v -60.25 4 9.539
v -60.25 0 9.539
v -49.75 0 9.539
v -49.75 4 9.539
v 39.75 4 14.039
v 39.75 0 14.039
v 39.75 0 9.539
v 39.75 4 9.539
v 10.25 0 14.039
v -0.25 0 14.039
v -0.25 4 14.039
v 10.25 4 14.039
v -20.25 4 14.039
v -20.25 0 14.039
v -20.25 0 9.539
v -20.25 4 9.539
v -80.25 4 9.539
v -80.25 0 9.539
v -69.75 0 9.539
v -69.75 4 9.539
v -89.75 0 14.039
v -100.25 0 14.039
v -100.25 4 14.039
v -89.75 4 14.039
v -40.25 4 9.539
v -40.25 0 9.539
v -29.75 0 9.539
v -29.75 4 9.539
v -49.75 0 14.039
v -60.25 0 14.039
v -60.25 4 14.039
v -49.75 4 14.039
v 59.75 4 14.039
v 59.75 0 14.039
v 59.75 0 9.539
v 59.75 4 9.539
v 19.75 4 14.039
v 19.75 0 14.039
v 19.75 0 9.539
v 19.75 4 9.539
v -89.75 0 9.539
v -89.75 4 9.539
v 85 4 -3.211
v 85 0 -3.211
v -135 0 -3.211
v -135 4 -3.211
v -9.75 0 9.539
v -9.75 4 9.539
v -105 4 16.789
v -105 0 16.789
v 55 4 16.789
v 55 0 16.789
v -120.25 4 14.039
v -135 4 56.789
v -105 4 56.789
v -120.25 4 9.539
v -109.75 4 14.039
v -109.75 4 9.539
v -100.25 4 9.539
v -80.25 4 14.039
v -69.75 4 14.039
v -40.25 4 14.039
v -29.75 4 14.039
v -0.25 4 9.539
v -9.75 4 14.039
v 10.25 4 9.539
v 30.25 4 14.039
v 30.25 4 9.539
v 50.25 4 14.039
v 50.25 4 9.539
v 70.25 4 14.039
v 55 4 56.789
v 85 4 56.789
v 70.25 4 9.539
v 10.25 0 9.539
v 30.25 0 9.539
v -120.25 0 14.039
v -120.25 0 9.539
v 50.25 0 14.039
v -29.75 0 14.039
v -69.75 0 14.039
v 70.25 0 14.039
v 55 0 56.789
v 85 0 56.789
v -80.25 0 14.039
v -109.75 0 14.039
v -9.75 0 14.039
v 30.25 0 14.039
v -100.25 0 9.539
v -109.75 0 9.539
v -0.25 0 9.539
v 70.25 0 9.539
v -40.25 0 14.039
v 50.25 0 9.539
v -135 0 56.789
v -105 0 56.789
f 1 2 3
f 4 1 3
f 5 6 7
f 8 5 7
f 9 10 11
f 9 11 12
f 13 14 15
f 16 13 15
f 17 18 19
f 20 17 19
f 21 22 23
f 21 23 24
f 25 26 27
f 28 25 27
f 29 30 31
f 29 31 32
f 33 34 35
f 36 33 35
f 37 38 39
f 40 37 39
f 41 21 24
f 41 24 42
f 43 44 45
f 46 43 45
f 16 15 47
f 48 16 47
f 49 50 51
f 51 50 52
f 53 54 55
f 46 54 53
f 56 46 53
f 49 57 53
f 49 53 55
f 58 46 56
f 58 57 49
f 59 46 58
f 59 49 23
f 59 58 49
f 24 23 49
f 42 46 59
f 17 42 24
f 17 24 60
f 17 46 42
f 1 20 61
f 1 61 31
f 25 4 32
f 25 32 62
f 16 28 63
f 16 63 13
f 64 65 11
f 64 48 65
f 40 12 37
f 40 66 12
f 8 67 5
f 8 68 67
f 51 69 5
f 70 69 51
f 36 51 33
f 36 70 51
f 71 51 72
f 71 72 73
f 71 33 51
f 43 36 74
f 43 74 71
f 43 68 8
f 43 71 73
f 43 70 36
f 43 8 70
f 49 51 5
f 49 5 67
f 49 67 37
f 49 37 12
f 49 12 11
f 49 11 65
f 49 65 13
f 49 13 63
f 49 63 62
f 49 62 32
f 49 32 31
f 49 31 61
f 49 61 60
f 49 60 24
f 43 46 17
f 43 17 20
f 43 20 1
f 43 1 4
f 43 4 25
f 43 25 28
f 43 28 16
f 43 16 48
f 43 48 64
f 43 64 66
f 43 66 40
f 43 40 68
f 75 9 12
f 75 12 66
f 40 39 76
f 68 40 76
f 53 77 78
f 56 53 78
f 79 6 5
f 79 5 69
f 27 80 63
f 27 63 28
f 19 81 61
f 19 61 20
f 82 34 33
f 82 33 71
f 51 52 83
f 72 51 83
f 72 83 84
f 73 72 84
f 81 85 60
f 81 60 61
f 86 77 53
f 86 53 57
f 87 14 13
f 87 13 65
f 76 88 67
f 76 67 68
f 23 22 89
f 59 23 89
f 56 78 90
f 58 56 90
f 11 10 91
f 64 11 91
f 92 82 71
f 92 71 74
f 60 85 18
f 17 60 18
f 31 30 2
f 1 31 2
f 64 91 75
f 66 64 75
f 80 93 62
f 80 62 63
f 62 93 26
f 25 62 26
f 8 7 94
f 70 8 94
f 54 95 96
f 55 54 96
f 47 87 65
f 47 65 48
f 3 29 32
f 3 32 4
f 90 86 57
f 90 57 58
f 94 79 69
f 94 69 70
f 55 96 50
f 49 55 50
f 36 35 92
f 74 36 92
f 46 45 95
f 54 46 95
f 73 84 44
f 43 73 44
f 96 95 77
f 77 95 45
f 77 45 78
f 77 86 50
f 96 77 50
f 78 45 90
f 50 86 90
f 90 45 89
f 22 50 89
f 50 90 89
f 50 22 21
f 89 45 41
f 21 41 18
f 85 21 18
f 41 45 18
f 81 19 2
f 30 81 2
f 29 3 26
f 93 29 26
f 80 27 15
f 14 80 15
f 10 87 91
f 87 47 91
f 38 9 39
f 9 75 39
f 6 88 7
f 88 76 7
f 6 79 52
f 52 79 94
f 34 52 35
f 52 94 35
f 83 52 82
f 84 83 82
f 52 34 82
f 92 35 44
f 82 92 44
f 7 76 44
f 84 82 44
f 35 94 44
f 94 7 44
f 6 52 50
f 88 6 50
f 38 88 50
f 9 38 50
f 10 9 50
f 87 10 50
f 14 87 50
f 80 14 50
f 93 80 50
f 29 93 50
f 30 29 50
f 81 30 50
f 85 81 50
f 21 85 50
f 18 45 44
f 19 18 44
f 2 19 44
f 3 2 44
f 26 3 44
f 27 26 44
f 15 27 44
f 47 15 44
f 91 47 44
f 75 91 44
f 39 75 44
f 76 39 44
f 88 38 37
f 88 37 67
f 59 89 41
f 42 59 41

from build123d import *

# Parameters (mm, degrees)
EXTRUDE_1_DEPTH     = 4
SKETCH_2_W          = 10.5
SKETCH_2_H          = 4.5
CUT_EXTRUDE_1_DEPTH = 147.512735554


with BuildPart() as part:
    # Эскиз1 → Бобышка-Вытянуть1 (new body)
    with BuildSketch(Plane(origin=(0, 0, 0), x_dir=(1, 0, 0), z_dir=(0, 1, 0))):
        Polygon((-135, -16.788922156), (-135, -56.788922156), (-105, -56.788922156), (-105, -16.788922156), (55, -16.788922156), (55, -56.788922156), (85, -56.788922156), (85, -16.788922156), (85, 3.211077844), (-135, 3.211077844), align=None)
    extrude(amount=EXTRUDE_1_DEPTH)

    # Эскиз2 → Вырез-Вытянуть1 (cut, through all)
    with BuildSketch(Plane(origin=(0, 0, 0), x_dir=(1, 0, 0), z_dir=(0, 1, 0))):
        with Locations((-115, -11.788922156)):
            Rectangle(SKETCH_2_W, SKETCH_2_H)
        with Locations((-95, -11.788922156)):
            Rectangle(SKETCH_2_W, SKETCH_2_H)
        with Locations((-75, -11.788922156)):
            Rectangle(SKETCH_2_W, SKETCH_2_H)
        with Locations((-55, -11.788922156)):
            Rectangle(SKETCH_2_W, SKETCH_2_H)
        with Locations((-35, -11.788922156)):
            Rectangle(SKETCH_2_W, SKETCH_2_H)
        with Locations((-15, -11.788922156)):
            Rectangle(SKETCH_2_W, SKETCH_2_H)
        with Locations((5, -11.788922156)):
            Rectangle(SKETCH_2_W, SKETCH_2_H)
        with Locations((25, -11.788922156)):
            Rectangle(SKETCH_2_W, SKETCH_2_H)
        with Locations((45, -11.788922156)):
            Rectangle(SKETCH_2_W, SKETCH_2_H)
        with Locations((65, -11.788922156)):
            Rectangle(SKETCH_2_W, SKETCH_2_H)
    extrude(amount=CUT_EXTRUDE_1_DEPTH, mode=Mode.SUBTRACT)


solid = part.part
